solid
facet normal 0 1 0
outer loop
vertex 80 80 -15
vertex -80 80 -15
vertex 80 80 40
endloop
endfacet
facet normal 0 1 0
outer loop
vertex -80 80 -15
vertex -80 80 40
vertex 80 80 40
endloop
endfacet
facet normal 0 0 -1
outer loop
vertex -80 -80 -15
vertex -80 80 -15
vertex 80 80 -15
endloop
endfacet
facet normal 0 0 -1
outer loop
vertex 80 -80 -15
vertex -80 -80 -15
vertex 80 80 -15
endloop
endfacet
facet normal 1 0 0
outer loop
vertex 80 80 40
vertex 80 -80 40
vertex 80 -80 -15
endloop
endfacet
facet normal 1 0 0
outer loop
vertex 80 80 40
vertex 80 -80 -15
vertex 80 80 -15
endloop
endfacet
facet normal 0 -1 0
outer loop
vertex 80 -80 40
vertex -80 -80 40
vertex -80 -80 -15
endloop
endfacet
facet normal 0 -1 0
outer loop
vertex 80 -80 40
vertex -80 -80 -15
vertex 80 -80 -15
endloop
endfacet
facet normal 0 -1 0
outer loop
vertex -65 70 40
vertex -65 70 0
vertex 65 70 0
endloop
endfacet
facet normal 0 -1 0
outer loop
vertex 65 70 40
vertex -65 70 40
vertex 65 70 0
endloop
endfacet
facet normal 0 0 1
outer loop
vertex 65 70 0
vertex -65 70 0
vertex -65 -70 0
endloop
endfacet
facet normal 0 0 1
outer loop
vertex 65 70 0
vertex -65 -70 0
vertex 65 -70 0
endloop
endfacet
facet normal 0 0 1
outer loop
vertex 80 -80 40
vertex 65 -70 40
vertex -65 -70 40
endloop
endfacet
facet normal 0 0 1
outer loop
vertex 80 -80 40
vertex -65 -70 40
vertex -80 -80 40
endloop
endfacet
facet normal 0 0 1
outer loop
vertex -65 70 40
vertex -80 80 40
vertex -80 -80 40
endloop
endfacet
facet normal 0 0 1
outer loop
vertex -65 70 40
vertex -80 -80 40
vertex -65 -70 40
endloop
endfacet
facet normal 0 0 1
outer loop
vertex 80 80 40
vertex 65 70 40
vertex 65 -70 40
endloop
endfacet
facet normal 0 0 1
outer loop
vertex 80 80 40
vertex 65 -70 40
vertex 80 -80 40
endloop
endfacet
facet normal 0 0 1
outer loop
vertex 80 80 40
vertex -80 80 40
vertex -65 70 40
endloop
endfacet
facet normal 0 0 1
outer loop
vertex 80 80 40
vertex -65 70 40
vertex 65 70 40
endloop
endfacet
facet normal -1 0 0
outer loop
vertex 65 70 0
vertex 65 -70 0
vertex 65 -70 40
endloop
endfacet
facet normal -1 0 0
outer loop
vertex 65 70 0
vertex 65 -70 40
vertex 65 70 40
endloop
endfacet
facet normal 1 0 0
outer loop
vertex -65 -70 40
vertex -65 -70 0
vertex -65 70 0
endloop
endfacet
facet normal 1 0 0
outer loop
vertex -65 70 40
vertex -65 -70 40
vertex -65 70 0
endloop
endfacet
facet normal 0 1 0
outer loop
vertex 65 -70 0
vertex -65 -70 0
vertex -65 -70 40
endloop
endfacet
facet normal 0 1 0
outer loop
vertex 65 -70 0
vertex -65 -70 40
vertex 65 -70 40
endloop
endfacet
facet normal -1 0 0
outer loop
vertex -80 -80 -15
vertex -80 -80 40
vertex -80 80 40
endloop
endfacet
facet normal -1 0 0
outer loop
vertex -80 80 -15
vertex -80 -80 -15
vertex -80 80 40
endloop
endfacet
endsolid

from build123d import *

# Parameters (mm, degrees)
F0_W     = 160
F0_H     = 160
F0_W_2   = 130
F0_H_2   = 140
F1_DEPTH = 40
F2_W     = 160
F2_H     = 160
F3_DEPTH = 15


with BuildPart() as f1:
    # F0 (on Top) → F1 (new body)
    with BuildSketch(Plane.XY):
        Rectangle(F0_W, F0_H)
        Rectangle(F0_W_2, F0_H_2, mode=Mode.SUBTRACT)
    extrude(amount=F1_DEPTH)

    # F2 (on Top) → F3 (join)
    with BuildSketch(Plane.XY):
        Rectangle(F2_W, F2_H)
    extrude(amount=-F3_DEPTH)


solid = f1.part
